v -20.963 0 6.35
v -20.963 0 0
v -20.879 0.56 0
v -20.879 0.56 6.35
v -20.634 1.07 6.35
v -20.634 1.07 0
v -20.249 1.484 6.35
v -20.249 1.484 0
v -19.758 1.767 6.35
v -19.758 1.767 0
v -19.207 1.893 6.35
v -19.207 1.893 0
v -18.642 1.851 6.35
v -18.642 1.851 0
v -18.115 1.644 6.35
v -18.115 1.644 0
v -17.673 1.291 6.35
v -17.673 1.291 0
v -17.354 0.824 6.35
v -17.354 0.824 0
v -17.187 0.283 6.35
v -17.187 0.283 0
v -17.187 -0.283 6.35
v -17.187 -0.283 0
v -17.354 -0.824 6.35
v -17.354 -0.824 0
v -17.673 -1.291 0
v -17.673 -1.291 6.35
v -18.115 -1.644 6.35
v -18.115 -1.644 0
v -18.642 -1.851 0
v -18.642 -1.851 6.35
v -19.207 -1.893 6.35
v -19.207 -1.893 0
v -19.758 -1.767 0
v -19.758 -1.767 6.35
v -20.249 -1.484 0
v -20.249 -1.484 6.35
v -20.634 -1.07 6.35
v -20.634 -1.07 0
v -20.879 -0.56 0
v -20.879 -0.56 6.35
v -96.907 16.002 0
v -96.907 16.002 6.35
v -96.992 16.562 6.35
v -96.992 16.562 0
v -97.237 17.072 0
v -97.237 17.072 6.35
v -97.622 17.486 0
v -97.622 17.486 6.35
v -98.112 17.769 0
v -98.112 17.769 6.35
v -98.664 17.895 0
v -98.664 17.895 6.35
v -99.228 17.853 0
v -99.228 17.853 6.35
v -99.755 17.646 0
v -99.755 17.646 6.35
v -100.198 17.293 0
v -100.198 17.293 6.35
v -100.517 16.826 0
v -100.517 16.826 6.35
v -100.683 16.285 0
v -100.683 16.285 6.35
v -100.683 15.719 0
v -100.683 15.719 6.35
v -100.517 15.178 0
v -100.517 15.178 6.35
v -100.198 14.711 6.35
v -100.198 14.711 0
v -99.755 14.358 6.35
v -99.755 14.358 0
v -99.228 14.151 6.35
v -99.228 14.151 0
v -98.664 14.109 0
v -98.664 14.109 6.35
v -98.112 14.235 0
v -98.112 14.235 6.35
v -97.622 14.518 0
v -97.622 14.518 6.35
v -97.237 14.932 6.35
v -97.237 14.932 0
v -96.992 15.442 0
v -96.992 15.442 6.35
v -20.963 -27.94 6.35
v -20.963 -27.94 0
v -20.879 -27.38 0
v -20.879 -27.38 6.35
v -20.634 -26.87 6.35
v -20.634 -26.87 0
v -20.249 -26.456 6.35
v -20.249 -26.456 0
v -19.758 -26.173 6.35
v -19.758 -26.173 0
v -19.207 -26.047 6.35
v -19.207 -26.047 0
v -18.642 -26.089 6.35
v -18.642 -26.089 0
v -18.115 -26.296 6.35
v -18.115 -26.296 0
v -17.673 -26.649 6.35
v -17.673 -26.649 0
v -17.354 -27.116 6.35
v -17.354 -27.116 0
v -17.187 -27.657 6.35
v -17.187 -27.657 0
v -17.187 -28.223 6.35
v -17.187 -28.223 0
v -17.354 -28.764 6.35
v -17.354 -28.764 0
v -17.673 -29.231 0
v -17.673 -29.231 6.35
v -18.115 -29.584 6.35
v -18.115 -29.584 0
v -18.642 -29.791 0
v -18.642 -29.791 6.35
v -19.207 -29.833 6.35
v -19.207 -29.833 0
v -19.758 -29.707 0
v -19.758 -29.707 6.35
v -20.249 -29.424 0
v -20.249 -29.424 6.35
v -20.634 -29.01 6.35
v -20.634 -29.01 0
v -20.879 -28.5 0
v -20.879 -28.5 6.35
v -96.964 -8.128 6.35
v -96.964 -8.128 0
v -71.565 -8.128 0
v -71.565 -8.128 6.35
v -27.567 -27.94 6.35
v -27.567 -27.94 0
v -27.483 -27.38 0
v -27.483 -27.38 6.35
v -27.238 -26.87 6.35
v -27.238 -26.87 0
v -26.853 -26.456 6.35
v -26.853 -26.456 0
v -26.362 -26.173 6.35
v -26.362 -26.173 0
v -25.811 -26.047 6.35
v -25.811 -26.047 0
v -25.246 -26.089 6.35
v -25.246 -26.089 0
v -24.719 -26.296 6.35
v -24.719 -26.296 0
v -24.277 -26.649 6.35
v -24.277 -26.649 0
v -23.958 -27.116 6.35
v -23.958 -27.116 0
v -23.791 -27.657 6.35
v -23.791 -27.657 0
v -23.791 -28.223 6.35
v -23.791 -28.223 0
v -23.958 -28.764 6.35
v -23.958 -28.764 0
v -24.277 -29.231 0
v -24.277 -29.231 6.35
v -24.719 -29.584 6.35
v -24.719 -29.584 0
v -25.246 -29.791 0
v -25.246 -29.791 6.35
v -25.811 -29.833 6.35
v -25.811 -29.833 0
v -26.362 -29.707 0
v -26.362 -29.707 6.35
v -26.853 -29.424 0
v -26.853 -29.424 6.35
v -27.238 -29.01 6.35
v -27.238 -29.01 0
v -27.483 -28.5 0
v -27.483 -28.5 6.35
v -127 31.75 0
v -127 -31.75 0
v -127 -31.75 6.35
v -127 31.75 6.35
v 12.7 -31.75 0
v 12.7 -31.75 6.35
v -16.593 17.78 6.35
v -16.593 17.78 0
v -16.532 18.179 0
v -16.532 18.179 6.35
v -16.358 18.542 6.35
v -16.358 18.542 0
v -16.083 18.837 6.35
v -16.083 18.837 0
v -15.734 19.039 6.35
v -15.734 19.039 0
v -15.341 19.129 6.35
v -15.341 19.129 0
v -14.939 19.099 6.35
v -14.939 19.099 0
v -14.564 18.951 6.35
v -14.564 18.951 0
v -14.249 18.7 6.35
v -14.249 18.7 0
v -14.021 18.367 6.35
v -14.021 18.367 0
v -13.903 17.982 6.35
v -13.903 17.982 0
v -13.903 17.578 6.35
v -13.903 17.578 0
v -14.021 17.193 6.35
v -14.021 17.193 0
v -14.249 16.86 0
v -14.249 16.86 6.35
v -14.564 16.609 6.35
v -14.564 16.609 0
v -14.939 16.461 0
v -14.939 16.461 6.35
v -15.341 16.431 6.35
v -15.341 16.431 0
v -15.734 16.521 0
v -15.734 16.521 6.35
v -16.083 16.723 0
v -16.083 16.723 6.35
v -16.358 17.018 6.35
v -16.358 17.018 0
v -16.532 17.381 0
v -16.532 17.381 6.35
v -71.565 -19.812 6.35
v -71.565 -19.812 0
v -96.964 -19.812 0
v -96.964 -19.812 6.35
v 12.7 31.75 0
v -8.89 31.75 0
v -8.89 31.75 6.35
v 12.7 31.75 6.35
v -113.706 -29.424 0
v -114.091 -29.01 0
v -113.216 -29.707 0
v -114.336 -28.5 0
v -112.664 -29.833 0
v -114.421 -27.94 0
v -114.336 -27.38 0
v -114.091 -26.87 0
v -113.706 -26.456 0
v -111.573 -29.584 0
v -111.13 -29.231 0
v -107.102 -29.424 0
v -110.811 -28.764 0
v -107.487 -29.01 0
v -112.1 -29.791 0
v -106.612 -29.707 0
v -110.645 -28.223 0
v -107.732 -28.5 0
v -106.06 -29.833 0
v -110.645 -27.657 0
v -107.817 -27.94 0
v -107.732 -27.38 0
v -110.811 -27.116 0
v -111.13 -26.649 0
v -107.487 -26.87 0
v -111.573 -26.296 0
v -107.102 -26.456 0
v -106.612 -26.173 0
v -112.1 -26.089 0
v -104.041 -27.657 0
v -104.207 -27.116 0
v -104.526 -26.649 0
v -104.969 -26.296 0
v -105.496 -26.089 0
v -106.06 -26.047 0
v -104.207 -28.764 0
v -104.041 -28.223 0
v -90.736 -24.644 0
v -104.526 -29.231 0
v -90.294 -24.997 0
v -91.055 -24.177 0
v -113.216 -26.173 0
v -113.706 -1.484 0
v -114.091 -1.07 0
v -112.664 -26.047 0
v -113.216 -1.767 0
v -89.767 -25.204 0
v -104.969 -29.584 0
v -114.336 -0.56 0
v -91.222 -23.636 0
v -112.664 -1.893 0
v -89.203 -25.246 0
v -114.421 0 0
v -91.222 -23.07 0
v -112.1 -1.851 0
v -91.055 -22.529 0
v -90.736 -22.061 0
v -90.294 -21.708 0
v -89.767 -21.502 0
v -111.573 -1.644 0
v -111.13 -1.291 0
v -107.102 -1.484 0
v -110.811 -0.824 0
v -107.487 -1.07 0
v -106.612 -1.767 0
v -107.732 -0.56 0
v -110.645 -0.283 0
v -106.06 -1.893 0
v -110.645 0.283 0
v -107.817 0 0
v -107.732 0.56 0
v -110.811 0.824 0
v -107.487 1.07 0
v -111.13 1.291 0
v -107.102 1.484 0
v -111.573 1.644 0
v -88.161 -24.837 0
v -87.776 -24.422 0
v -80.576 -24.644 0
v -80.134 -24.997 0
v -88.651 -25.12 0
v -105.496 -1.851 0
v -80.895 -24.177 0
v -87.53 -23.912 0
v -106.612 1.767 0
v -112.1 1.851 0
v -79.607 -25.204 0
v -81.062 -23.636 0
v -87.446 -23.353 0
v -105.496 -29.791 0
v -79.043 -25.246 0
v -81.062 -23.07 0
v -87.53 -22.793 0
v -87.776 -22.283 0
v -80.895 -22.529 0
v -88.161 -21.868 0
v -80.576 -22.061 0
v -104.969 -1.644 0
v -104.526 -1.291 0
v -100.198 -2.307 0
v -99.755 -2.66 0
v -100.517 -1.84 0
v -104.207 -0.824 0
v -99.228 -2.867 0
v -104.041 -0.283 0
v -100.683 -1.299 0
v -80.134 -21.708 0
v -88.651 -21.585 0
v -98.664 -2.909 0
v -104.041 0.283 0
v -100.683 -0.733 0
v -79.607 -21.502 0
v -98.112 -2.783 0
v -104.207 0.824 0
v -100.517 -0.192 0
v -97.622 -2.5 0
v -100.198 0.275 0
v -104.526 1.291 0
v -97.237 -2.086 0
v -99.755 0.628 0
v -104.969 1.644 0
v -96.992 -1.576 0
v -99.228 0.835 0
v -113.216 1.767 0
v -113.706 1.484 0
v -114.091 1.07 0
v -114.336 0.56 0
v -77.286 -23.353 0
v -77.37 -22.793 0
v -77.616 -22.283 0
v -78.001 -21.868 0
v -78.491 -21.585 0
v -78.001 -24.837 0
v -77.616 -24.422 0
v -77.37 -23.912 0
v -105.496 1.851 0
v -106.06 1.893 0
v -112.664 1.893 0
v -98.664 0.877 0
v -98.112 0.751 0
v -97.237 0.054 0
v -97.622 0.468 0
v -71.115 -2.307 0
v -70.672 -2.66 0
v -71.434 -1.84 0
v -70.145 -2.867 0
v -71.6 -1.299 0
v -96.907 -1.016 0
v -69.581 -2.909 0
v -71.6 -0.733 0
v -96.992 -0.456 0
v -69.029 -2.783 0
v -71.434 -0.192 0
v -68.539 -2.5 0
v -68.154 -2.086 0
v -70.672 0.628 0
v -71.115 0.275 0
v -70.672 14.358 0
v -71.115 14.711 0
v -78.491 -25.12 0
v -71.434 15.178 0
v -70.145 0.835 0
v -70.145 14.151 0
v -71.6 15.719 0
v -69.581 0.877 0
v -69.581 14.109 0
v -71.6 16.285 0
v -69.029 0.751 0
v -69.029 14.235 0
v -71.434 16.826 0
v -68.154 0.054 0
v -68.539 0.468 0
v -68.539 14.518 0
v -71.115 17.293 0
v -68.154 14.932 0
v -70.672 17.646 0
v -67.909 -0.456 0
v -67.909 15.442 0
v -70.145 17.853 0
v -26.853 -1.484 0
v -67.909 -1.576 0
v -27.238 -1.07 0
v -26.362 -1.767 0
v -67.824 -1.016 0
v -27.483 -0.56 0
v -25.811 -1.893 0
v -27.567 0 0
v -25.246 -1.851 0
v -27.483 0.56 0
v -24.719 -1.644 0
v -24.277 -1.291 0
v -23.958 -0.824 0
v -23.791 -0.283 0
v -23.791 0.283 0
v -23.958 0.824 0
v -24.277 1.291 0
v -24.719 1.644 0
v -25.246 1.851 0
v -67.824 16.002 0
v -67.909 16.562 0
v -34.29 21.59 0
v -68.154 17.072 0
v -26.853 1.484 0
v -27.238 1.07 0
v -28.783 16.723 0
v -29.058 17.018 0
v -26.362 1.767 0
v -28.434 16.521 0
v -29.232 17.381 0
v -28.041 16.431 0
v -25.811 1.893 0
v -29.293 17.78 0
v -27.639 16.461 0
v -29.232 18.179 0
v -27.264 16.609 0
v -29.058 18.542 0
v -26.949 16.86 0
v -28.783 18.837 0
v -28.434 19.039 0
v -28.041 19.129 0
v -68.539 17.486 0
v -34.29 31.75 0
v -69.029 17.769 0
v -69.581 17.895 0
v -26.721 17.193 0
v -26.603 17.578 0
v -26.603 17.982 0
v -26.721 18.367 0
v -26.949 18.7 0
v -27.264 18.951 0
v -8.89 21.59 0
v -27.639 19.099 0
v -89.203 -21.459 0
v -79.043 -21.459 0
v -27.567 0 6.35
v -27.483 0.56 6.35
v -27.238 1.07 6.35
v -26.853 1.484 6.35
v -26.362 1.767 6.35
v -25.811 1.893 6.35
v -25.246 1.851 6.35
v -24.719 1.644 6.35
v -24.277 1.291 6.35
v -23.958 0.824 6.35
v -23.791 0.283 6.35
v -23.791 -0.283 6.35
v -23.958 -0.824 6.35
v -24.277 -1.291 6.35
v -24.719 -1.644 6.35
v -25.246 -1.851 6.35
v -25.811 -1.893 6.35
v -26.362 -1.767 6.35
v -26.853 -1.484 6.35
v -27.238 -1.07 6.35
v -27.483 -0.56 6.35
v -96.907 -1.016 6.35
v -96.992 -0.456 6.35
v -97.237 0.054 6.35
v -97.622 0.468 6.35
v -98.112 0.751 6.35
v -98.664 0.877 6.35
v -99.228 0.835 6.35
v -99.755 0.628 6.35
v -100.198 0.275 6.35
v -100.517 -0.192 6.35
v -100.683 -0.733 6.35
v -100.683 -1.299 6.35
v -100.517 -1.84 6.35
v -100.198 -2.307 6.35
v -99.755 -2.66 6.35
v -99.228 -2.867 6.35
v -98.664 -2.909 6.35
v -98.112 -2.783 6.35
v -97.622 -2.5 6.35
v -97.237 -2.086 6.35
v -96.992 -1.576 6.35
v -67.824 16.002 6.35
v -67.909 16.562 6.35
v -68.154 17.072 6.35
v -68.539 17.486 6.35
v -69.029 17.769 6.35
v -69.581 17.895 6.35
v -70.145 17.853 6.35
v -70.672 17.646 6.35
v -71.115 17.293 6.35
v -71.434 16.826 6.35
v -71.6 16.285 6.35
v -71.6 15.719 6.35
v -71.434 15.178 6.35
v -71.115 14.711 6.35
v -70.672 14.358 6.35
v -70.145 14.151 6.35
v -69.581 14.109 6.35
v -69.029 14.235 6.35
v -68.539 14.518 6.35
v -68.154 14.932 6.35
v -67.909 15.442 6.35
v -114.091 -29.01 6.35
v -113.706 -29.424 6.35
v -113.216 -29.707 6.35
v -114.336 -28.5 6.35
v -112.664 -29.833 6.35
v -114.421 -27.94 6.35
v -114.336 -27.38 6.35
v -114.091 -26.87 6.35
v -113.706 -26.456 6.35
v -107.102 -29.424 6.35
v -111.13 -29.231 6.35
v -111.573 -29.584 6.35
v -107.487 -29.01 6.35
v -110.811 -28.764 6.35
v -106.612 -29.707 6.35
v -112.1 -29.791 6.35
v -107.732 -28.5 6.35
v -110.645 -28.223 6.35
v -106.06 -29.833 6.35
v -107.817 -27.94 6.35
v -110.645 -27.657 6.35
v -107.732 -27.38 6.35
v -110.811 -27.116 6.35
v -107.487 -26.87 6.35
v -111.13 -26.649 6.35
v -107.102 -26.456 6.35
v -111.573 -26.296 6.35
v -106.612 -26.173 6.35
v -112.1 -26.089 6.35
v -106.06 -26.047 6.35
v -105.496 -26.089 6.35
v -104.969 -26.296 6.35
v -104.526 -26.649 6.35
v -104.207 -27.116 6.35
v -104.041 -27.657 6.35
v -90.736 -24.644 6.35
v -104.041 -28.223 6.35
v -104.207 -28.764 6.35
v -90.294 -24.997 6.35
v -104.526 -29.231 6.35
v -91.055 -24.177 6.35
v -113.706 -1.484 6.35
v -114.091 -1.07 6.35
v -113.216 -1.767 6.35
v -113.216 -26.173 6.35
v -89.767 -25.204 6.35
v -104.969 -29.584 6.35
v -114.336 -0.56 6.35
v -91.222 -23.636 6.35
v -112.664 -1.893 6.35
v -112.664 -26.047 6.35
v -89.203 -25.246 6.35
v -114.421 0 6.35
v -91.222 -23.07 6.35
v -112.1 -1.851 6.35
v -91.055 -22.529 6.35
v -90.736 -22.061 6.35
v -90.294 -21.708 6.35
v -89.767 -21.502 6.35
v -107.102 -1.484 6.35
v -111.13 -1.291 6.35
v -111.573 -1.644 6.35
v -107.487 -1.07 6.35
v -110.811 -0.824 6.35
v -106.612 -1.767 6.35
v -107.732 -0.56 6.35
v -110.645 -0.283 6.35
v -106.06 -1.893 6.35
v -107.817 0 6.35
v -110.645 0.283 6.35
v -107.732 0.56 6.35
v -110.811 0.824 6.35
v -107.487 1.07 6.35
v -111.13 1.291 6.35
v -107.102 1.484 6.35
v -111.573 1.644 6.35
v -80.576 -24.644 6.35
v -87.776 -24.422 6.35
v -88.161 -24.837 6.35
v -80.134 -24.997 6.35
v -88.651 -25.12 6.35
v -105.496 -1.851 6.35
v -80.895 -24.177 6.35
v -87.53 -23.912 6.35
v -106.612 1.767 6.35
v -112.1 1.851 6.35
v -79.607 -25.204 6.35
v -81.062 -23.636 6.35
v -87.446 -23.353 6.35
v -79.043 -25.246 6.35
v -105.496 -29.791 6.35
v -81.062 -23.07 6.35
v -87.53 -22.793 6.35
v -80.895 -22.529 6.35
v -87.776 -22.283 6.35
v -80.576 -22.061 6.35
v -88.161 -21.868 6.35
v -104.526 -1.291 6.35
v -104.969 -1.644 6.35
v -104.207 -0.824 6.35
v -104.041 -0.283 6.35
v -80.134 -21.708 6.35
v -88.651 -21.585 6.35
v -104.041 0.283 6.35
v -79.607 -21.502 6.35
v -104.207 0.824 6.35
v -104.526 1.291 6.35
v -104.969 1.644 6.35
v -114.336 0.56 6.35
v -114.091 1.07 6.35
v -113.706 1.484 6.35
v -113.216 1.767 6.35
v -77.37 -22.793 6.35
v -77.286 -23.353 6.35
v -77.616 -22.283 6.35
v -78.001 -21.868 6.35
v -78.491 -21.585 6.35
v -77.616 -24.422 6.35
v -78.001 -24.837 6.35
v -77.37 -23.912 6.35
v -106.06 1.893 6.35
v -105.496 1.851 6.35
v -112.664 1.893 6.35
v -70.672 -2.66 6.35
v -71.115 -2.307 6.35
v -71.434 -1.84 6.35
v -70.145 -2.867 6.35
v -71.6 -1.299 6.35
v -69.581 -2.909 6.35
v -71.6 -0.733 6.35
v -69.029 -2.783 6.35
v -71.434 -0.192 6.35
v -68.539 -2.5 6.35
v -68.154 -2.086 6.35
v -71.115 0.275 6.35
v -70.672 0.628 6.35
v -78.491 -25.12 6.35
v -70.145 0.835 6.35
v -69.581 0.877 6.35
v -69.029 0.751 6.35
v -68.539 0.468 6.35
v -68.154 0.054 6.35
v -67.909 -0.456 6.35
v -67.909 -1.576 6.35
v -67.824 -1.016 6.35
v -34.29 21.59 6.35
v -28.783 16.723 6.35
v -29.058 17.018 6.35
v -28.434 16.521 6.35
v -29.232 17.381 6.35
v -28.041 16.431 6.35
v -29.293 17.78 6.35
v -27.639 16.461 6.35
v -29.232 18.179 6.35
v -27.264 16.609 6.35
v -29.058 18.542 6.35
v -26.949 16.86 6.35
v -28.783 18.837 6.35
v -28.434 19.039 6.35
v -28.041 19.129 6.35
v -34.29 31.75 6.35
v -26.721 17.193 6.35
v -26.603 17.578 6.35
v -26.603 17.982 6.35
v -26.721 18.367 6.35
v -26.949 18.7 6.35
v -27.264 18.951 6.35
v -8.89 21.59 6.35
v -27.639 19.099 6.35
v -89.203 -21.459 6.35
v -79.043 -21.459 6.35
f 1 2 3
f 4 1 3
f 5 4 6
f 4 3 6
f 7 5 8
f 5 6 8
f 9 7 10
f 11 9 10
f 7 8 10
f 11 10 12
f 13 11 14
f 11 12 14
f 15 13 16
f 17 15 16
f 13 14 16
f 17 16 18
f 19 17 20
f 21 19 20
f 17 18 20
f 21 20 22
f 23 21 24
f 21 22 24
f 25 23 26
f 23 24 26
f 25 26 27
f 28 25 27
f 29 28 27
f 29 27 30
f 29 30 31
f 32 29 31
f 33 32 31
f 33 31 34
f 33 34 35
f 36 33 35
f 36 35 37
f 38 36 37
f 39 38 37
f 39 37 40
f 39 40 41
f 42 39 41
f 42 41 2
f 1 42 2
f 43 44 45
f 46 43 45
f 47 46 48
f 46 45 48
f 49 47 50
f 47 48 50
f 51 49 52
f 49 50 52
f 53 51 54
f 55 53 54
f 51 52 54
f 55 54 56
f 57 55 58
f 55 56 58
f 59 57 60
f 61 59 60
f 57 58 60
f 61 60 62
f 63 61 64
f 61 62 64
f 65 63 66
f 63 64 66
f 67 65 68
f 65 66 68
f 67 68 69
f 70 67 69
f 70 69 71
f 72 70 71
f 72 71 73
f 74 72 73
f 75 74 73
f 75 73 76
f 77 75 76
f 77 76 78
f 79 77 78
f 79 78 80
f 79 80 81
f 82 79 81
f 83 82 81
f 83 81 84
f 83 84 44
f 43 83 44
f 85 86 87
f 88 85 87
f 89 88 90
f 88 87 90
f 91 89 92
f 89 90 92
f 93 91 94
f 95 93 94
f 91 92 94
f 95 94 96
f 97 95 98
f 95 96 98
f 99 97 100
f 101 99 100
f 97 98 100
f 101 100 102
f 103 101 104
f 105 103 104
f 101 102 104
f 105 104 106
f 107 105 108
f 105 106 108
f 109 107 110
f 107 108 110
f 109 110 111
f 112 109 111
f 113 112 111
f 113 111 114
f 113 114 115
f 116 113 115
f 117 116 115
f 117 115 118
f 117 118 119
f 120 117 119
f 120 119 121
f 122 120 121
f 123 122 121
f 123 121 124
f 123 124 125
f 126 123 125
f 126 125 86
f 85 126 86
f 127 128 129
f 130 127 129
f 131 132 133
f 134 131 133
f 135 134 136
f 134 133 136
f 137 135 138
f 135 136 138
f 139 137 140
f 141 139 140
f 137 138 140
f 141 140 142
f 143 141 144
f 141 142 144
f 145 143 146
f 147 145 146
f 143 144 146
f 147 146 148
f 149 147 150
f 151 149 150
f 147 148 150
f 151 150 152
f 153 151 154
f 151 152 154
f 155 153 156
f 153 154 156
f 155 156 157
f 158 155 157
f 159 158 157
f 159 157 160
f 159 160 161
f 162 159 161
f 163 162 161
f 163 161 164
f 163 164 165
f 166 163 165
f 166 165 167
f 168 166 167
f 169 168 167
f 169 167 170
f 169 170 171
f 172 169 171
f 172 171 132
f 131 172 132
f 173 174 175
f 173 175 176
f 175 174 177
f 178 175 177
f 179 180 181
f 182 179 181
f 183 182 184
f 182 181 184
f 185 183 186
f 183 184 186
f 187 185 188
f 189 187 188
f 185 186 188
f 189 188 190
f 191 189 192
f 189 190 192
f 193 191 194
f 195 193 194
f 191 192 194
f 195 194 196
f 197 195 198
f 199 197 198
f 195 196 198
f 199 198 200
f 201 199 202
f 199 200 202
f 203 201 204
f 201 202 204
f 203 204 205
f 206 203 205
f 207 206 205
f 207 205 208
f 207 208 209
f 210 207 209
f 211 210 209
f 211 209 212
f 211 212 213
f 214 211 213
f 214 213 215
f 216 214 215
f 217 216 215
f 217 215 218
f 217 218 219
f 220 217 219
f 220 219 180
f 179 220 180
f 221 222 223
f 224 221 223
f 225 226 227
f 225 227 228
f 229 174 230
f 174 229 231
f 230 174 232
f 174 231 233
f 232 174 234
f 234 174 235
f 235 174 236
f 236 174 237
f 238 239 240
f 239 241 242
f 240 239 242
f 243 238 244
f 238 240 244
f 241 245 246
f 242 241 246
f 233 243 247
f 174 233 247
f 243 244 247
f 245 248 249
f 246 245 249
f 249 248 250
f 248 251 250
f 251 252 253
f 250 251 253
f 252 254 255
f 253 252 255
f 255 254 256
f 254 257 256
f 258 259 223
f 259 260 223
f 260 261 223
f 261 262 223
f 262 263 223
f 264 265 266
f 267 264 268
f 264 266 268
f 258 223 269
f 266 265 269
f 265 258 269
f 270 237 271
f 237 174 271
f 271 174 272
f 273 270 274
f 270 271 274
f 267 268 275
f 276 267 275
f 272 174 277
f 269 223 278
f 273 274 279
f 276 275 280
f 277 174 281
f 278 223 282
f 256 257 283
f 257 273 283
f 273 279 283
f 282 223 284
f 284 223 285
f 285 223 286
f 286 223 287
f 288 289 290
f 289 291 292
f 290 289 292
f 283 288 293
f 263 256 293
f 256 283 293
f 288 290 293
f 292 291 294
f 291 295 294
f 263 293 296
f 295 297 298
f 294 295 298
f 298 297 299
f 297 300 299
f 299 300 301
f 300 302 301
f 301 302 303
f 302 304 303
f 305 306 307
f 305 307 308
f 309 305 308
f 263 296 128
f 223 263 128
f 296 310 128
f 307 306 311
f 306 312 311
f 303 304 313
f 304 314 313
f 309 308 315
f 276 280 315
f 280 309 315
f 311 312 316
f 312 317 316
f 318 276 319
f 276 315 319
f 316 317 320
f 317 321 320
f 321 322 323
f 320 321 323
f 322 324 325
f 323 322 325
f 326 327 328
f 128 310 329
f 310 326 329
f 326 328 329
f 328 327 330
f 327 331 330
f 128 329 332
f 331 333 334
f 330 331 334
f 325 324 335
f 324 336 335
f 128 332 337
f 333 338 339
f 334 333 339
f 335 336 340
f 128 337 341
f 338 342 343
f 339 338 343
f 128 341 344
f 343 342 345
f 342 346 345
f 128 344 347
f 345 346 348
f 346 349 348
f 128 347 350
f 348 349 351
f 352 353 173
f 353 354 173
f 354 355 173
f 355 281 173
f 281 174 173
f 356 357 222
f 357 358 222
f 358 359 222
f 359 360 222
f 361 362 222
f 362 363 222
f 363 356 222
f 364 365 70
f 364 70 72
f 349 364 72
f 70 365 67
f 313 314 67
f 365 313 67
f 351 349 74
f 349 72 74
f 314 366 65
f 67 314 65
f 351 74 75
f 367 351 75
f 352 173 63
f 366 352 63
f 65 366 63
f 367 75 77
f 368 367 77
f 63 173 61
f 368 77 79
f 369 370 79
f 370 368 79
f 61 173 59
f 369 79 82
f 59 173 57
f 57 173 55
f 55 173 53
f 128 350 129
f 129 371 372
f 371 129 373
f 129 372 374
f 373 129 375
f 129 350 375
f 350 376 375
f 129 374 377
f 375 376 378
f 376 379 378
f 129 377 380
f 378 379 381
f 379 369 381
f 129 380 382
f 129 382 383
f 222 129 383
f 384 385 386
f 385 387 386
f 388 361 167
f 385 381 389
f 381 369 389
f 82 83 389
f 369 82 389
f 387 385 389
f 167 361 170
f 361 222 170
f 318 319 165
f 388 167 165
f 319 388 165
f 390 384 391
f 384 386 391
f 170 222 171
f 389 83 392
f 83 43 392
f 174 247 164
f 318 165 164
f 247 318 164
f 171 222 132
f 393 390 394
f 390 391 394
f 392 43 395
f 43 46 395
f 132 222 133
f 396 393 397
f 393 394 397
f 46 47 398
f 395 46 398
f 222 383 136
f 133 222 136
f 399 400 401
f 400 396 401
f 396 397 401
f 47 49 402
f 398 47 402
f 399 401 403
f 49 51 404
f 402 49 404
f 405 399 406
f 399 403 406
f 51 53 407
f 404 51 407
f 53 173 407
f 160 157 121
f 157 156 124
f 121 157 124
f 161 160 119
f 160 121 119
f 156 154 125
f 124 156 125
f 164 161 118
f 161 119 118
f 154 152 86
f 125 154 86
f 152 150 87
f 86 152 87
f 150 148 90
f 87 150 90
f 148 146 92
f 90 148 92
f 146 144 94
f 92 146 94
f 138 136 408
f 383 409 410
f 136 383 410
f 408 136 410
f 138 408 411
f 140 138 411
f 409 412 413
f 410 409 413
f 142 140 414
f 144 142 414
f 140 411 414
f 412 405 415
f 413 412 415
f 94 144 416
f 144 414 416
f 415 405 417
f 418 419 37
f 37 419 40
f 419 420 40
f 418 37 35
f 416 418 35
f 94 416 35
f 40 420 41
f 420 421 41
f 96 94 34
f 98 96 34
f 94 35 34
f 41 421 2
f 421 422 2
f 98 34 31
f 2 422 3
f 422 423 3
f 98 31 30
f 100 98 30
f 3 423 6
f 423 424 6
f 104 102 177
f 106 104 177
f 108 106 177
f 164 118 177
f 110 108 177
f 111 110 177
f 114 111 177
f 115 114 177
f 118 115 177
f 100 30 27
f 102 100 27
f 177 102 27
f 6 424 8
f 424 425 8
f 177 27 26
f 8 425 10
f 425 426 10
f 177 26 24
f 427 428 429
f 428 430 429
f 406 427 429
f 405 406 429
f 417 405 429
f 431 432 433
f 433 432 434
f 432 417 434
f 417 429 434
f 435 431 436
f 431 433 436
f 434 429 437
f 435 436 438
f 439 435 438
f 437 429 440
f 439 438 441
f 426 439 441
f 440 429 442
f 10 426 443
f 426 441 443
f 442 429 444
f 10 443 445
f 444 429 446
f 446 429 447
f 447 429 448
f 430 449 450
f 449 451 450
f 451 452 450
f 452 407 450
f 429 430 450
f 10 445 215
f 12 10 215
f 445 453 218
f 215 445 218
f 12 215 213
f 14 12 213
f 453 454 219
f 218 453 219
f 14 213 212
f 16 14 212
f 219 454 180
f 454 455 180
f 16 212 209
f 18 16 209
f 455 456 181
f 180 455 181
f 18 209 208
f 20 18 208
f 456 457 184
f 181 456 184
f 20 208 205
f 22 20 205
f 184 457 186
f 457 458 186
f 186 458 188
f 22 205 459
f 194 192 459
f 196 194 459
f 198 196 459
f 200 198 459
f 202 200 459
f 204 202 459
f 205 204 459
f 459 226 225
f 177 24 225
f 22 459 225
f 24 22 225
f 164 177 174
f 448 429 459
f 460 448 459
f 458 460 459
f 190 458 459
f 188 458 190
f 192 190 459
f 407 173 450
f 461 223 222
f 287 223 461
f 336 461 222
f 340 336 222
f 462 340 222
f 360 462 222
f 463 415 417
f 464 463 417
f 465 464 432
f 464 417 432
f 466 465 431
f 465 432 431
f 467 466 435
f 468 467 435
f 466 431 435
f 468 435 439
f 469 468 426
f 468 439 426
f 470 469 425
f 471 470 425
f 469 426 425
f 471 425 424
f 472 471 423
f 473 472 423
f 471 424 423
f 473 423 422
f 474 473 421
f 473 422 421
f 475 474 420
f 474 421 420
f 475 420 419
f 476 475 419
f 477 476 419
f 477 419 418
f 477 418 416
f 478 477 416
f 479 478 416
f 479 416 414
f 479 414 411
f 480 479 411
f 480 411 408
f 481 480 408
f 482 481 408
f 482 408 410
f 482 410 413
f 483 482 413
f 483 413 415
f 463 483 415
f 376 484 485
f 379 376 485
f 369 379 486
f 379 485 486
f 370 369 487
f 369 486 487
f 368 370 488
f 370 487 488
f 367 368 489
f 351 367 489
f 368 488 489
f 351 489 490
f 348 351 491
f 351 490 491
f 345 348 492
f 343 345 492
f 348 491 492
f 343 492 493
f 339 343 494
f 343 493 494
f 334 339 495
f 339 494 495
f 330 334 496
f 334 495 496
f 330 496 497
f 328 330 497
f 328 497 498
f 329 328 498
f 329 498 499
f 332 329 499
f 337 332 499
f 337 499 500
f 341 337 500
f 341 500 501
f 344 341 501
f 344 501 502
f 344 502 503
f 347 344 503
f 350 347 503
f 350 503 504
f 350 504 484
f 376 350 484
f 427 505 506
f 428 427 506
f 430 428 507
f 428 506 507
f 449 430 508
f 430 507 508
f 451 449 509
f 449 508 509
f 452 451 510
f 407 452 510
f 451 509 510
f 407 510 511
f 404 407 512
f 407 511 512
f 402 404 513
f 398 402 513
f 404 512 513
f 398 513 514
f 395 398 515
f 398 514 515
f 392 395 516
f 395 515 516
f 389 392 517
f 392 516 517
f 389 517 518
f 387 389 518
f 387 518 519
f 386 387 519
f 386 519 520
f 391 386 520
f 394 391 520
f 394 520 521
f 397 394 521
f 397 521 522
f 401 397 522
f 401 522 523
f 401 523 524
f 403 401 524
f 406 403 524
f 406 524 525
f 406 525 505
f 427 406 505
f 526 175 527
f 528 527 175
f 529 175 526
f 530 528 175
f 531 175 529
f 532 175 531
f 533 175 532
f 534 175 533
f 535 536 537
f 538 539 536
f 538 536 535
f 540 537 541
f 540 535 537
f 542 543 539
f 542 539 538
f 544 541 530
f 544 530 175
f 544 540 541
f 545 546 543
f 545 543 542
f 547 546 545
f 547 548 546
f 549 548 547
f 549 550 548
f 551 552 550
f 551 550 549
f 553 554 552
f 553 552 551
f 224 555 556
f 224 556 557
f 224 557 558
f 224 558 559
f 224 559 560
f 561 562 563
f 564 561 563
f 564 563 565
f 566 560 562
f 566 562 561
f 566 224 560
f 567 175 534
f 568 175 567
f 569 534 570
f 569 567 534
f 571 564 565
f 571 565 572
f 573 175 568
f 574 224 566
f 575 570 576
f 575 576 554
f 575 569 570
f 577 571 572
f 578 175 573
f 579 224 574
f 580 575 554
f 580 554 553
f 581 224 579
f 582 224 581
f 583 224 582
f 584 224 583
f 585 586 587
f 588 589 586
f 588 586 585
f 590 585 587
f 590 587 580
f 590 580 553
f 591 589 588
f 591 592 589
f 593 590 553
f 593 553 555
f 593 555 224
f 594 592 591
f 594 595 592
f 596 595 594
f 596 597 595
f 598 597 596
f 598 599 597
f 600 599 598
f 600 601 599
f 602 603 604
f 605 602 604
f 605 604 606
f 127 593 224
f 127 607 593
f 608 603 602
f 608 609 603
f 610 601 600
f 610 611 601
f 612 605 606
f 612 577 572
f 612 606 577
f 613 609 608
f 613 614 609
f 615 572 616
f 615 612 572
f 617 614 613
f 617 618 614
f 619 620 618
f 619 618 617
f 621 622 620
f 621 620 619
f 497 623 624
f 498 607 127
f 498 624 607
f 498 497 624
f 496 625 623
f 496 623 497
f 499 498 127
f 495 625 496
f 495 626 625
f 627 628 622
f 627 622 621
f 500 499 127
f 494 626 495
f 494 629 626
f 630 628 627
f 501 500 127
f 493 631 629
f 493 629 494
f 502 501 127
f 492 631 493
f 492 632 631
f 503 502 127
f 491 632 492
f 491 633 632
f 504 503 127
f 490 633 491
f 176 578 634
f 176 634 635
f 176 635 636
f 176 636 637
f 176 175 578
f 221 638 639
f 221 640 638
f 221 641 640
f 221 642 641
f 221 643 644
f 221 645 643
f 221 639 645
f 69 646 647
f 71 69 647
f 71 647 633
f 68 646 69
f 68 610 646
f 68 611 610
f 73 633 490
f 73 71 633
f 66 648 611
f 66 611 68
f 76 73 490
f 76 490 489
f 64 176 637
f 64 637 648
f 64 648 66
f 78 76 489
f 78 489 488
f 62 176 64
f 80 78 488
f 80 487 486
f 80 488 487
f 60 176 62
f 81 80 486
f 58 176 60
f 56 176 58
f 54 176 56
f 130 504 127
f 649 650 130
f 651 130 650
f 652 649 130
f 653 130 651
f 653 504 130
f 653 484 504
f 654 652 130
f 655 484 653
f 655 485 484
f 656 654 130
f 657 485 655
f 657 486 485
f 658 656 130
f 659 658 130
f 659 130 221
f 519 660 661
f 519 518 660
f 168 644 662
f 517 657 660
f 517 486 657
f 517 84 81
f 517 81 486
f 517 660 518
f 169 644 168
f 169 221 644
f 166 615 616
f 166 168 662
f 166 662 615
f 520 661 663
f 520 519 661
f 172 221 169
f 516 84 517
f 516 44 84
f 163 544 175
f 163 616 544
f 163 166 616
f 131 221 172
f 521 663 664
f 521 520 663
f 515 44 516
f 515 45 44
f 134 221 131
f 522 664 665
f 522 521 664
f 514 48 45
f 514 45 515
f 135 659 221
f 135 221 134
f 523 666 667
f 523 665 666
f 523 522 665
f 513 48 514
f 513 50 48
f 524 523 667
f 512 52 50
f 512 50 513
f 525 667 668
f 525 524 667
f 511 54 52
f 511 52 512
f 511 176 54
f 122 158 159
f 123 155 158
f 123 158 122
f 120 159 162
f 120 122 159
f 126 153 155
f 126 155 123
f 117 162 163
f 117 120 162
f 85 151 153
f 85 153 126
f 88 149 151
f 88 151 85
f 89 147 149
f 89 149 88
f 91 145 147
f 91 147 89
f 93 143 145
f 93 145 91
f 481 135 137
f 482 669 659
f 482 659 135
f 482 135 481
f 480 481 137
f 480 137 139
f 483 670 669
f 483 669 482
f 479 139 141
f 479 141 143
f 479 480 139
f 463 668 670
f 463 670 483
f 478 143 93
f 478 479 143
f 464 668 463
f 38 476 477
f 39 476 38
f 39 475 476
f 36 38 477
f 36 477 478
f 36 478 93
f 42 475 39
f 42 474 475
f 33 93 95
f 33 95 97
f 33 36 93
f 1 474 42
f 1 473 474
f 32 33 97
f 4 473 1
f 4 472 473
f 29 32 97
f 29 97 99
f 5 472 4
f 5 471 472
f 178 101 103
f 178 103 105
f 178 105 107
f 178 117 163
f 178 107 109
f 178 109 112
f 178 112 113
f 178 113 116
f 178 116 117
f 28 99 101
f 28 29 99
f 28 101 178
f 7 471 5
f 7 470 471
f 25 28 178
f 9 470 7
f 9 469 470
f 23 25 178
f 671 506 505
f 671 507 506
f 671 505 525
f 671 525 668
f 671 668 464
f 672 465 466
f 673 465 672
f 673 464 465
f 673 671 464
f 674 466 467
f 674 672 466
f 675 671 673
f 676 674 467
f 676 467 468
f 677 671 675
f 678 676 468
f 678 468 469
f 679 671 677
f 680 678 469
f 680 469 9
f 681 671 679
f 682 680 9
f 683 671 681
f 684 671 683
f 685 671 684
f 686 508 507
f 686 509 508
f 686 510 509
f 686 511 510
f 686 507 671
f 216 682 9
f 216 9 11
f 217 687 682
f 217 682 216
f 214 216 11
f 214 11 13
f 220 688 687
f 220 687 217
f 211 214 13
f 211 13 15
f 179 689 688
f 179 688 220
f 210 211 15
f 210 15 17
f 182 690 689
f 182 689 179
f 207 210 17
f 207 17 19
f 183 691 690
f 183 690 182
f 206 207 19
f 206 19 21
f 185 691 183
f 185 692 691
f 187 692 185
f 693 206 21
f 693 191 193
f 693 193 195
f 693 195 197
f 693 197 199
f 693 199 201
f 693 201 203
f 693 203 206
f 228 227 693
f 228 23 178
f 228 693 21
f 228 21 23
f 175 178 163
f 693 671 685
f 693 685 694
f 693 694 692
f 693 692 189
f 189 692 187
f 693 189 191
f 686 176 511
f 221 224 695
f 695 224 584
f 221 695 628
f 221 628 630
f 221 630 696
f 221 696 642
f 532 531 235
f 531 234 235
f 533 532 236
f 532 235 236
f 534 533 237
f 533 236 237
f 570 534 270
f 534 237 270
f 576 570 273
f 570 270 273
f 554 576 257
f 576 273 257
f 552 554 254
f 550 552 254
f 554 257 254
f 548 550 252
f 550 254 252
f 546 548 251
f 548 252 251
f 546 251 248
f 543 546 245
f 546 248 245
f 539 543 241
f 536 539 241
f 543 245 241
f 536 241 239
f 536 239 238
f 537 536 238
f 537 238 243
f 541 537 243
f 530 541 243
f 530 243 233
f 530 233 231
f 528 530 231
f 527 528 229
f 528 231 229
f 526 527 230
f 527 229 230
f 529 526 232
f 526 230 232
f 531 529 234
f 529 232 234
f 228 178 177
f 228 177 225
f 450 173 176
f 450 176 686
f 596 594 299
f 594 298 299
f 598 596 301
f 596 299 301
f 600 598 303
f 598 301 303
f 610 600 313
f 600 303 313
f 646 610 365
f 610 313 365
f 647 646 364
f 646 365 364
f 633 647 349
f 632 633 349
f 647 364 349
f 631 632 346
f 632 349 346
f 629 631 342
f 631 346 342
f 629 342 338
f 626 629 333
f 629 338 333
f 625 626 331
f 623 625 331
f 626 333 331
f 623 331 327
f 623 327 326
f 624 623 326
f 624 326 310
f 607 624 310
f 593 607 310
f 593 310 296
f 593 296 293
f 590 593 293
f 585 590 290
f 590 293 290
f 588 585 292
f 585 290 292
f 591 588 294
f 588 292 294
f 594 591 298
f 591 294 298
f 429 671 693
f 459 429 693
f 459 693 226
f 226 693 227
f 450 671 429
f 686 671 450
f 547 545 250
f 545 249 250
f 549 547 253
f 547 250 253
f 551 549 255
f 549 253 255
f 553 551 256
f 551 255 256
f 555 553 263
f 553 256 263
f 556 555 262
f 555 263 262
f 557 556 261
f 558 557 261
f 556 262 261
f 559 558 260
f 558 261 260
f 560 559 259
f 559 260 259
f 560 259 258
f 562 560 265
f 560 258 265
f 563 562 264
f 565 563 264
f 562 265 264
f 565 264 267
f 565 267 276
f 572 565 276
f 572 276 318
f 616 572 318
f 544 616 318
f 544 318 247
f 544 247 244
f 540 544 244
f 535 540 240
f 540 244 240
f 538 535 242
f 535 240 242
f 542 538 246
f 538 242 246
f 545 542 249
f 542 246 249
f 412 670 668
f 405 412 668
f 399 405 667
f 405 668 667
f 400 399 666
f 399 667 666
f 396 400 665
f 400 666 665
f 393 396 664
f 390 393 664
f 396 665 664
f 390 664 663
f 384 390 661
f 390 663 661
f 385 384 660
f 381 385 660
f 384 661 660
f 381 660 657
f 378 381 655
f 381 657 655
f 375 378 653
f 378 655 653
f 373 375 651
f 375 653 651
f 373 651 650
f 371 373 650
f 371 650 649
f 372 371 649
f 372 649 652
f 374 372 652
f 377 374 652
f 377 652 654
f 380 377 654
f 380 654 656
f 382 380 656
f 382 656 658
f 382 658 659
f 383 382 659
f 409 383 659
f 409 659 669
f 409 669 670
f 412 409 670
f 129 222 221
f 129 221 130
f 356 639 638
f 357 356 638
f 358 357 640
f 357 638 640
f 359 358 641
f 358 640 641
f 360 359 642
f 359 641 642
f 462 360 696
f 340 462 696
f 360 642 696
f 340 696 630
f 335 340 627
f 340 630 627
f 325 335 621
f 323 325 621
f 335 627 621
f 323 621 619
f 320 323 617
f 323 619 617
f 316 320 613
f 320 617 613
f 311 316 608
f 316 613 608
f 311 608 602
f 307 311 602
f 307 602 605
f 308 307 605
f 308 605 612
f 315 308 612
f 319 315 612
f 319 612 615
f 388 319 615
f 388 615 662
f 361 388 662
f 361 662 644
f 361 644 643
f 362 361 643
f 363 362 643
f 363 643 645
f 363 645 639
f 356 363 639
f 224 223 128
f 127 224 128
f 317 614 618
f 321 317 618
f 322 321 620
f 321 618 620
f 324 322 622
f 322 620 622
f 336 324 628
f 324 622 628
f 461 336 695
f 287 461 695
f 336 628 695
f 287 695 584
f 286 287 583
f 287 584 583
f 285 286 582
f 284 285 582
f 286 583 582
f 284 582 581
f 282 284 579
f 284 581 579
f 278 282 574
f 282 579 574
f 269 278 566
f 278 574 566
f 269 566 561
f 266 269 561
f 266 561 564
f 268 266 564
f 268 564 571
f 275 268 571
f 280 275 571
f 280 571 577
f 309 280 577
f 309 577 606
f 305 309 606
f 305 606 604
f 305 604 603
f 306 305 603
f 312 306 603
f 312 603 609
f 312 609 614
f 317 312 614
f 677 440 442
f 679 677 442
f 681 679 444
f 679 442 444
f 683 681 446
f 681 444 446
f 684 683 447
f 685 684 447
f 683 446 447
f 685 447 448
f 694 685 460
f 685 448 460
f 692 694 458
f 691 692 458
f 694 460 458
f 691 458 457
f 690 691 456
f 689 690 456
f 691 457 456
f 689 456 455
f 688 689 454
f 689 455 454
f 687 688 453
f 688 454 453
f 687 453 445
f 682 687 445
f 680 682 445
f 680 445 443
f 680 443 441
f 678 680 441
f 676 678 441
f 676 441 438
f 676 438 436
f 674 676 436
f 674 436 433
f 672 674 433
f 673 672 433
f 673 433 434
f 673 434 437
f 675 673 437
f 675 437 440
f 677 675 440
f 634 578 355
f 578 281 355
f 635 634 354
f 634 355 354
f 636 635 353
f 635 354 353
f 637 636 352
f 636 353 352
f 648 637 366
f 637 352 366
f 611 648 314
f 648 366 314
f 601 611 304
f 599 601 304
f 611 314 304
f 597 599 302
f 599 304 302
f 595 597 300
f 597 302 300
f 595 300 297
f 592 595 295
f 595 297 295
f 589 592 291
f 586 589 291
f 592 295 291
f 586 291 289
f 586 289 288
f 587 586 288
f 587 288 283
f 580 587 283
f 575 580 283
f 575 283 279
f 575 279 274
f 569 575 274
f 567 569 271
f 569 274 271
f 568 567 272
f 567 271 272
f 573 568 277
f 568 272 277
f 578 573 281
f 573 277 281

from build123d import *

# Parameters (mm, degrees)
SKETCH1_W                     = 254
SKETCH1_H                     = 63.5
BOSS_EXTRUDE1_DEPTH           = 6.35
F_6_CLEARANCE_HOLE1_D         = 3.7973
F_6_CLEARANCE_HOLE1_DEPTH     = 6.35
F_6_CLEARANCE_HOLE1_TIP       = 1.140824014
F_6_CLEARANCE_HOLE2_D         = 3.7973
F_6_CLEARANCE_HOLE2_DEPTH     = 7.62
F_6_CLEARANCE_HOLE2_TIP       = 1.140824014
SKETCH21_W                    = 12.7
SKETCH21_H                    = 11.684
CUT_EXTRUDE7_DEPTH            = 132.062523247
F_6_CLEARANCE_HOLE3_D         = 3.7973
F_6_CLEARANCE_HOLE3_DEPTH     = 7.62
F_6_CLEARANCE_HOLE3_TIP       = 1.140824014
F_6_CLEARANCE_HOLE4_D         = 3.7973
F_6_CLEARANCE_HOLE4_DEPTH     = 7.62
F_6_CLEARANCE_HOLE4_TIP       = 1.140824014
SKETCH27_W                    = 114.3
SKETCH27_H                    = 63.5
CUT_EXTRUDE9_DEPTH            = 132.062523247
SKETCH28_W                    = 25.4
SKETCH28_H                    = 10.16
CUT_EXTRUDE10_DEPTH           = 33.02
TAP_DRILL_FOR_6_32_TAP1_D     = 2.7051
TAP_DRILL_FOR_6_32_TAP1_DEPTH = 10.16
TAP_DRILL_FOR_6_32_TAP1_TIP   = 0.81269403
F_6_CLEARANCE_HOLE5_D         = 3.7973
F_6_CLEARANCE_HOLE5_DEPTH     = 10.16
F_6_CLEARANCE_HOLE5_TIP       = 1.140824014


with BuildPart() as part:
    # Sketch1 → Boss-Extrude1 (new body)
    with BuildSketch(Plane.XY):
        Rectangle(SKETCH1_W, SKETCH1_H)
    extrude(amount=BOSS_EXTRUDE1_DEPTH)

    # #6 Clearance Hole1
    with Locations(Plane.XY.offset(6.35)):
        with Locations((-105.918, 0), (-112.522, -27.94), (-112.522, 0), (-105.918, -27.94)):
            Hole(F_6_CLEARANCE_HOLE1_D / 2, depth=F_6_CLEARANCE_HOLE1_DEPTH)
            with Locations((0, 0, -(F_6_CLEARANCE_HOLE1_DEPTH + F_6_CLEARANCE_HOLE1_TIP / 2))):  # 118° drill point
                Cone(0, F_6_CLEARANCE_HOLE1_D / 2, F_6_CLEARANCE_HOLE1_TIP, mode=Mode.SUBTRACT)

    # #6 Clearance Hole2
    with Locations(Plane(origin=(0, 0, 0), x_dir=(-1, 0, 0), z_dir=(0, 0, -1))):
        with Locations((98.806, -1.016), (69.723, -1.016)):
            Hole(F_6_CLEARANCE_HOLE2_D / 2, depth=F_6_CLEARANCE_HOLE2_DEPTH)
            with Locations((0, 0, -(F_6_CLEARANCE_HOLE2_DEPTH + F_6_CLEARANCE_HOLE2_TIP / 2))):  # 118° drill point
                Cone(0, F_6_CLEARANCE_HOLE2_D / 2, F_6_CLEARANCE_HOLE2_TIP, mode=Mode.SUBTRACT)

    # Sketch21 → Cut-Extrude7 (cut, through all)
    with BuildSketch(Plane(origin=(0, 0, 0), x_dir=(-1, 0, 0), z_dir=(0, 0, -1))):
        with Locations((77.9145, -13.97)):
            Rectangle(SKETCH21_W, SKETCH21_H)
        with Locations((90.6145, -13.97)):
            Rectangle(SKETCH21_W, SKETCH21_H)
    extrude(amount=-CUT_EXTRUDE7_DEPTH, mode=Mode.SUBTRACT)

    # #6 Clearance Hole3
    with Locations(Plane(origin=(0, 0, 0), x_dir=(-1, 0, 0), z_dir=(0, 0, -1))):
        with Locations((69.723, 16.002), (98.806, 16.002)):
            Hole(F_6_CLEARANCE_HOLE3_D / 2, depth=F_6_CLEARANCE_HOLE3_DEPTH)
            with Locations((0, 0, -(F_6_CLEARANCE_HOLE3_DEPTH + F_6_CLEARANCE_HOLE3_TIP / 2))):  # 118° drill point
                Cone(0, F_6_CLEARANCE_HOLE3_D / 2, F_6_CLEARANCE_HOLE3_TIP, mode=Mode.SUBTRACT)

    # #6 Clearance Hole4
    with Locations(Plane(origin=(0, 0, 0), x_dir=(-1, 0, 0), z_dir=(0, 0, -1))):
        with Locations((79.1845, -23.35276), (89.3445, -23.35276)):
            Hole(F_6_CLEARANCE_HOLE4_D / 2, depth=F_6_CLEARANCE_HOLE4_DEPTH)
            with Locations((0, 0, -(F_6_CLEARANCE_HOLE4_DEPTH + F_6_CLEARANCE_HOLE4_TIP / 2))):  # 118° drill point
                Cone(0, F_6_CLEARANCE_HOLE4_D / 2, F_6_CLEARANCE_HOLE4_TIP, mode=Mode.SUBTRACT)

    # Sketch27 → Cut-Extrude9 (cut, through all)
    with BuildSketch(Plane.XY.offset(6.35)):
        with Locations((69.85, 0)):
            Rectangle(SKETCH27_W, SKETCH27_H)
    extrude(amount=-CUT_EXTRUDE9_DEPTH, mode=Mode.SUBTRACT)

    # Sketch28 → Cut-Extrude10 (cut)
    with BuildSketch(Plane.XY.offset(6.35)):
        with Locations((-21.59, 26.67)):
            Rectangle(SKETCH28_W, SKETCH28_H)
    extrude(amount=-CUT_EXTRUDE10_DEPTH, mode=Mode.SUBTRACT)

    # Tap Drill for #6-32 Tap1
    with Locations(Plane.XY.offset(6.35)):
        with Locations((-27.94, 17.78), (-15.24, 17.78)):
            Hole(TAP_DRILL_FOR_6_32_TAP1_D / 2, depth=TAP_DRILL_FOR_6_32_TAP1_DEPTH)
            with Locations((0, 0, -(TAP_DRILL_FOR_6_32_TAP1_DEPTH + TAP_DRILL_FOR_6_32_TAP1_TIP / 2))):  # 118° drill point
                Cone(0, TAP_DRILL_FOR_6_32_TAP1_D / 2, TAP_DRILL_FOR_6_32_TAP1_TIP, mode=Mode.SUBTRACT)

    # #6 Clearance Hole5
    with Locations(Plane.XY.offset(6.35)):
        with Locations((-25.668797482, 0), (-19.064797482, 0), (-25.668797482, -27.94), (-19.064797482, -27.94)):
            Hole(F_6_CLEARANCE_HOLE5_D / 2, depth=F_6_CLEARANCE_HOLE5_DEPTH)
            with Locations((0, 0, -(F_6_CLEARANCE_HOLE5_DEPTH + F_6_CLEARANCE_HOLE5_TIP / 2))):  # 118° drill point
                Cone(0, F_6_CLEARANCE_HOLE5_D / 2, F_6_CLEARANCE_HOLE5_TIP, mode=Mode.SUBTRACT)


solid = part.part
